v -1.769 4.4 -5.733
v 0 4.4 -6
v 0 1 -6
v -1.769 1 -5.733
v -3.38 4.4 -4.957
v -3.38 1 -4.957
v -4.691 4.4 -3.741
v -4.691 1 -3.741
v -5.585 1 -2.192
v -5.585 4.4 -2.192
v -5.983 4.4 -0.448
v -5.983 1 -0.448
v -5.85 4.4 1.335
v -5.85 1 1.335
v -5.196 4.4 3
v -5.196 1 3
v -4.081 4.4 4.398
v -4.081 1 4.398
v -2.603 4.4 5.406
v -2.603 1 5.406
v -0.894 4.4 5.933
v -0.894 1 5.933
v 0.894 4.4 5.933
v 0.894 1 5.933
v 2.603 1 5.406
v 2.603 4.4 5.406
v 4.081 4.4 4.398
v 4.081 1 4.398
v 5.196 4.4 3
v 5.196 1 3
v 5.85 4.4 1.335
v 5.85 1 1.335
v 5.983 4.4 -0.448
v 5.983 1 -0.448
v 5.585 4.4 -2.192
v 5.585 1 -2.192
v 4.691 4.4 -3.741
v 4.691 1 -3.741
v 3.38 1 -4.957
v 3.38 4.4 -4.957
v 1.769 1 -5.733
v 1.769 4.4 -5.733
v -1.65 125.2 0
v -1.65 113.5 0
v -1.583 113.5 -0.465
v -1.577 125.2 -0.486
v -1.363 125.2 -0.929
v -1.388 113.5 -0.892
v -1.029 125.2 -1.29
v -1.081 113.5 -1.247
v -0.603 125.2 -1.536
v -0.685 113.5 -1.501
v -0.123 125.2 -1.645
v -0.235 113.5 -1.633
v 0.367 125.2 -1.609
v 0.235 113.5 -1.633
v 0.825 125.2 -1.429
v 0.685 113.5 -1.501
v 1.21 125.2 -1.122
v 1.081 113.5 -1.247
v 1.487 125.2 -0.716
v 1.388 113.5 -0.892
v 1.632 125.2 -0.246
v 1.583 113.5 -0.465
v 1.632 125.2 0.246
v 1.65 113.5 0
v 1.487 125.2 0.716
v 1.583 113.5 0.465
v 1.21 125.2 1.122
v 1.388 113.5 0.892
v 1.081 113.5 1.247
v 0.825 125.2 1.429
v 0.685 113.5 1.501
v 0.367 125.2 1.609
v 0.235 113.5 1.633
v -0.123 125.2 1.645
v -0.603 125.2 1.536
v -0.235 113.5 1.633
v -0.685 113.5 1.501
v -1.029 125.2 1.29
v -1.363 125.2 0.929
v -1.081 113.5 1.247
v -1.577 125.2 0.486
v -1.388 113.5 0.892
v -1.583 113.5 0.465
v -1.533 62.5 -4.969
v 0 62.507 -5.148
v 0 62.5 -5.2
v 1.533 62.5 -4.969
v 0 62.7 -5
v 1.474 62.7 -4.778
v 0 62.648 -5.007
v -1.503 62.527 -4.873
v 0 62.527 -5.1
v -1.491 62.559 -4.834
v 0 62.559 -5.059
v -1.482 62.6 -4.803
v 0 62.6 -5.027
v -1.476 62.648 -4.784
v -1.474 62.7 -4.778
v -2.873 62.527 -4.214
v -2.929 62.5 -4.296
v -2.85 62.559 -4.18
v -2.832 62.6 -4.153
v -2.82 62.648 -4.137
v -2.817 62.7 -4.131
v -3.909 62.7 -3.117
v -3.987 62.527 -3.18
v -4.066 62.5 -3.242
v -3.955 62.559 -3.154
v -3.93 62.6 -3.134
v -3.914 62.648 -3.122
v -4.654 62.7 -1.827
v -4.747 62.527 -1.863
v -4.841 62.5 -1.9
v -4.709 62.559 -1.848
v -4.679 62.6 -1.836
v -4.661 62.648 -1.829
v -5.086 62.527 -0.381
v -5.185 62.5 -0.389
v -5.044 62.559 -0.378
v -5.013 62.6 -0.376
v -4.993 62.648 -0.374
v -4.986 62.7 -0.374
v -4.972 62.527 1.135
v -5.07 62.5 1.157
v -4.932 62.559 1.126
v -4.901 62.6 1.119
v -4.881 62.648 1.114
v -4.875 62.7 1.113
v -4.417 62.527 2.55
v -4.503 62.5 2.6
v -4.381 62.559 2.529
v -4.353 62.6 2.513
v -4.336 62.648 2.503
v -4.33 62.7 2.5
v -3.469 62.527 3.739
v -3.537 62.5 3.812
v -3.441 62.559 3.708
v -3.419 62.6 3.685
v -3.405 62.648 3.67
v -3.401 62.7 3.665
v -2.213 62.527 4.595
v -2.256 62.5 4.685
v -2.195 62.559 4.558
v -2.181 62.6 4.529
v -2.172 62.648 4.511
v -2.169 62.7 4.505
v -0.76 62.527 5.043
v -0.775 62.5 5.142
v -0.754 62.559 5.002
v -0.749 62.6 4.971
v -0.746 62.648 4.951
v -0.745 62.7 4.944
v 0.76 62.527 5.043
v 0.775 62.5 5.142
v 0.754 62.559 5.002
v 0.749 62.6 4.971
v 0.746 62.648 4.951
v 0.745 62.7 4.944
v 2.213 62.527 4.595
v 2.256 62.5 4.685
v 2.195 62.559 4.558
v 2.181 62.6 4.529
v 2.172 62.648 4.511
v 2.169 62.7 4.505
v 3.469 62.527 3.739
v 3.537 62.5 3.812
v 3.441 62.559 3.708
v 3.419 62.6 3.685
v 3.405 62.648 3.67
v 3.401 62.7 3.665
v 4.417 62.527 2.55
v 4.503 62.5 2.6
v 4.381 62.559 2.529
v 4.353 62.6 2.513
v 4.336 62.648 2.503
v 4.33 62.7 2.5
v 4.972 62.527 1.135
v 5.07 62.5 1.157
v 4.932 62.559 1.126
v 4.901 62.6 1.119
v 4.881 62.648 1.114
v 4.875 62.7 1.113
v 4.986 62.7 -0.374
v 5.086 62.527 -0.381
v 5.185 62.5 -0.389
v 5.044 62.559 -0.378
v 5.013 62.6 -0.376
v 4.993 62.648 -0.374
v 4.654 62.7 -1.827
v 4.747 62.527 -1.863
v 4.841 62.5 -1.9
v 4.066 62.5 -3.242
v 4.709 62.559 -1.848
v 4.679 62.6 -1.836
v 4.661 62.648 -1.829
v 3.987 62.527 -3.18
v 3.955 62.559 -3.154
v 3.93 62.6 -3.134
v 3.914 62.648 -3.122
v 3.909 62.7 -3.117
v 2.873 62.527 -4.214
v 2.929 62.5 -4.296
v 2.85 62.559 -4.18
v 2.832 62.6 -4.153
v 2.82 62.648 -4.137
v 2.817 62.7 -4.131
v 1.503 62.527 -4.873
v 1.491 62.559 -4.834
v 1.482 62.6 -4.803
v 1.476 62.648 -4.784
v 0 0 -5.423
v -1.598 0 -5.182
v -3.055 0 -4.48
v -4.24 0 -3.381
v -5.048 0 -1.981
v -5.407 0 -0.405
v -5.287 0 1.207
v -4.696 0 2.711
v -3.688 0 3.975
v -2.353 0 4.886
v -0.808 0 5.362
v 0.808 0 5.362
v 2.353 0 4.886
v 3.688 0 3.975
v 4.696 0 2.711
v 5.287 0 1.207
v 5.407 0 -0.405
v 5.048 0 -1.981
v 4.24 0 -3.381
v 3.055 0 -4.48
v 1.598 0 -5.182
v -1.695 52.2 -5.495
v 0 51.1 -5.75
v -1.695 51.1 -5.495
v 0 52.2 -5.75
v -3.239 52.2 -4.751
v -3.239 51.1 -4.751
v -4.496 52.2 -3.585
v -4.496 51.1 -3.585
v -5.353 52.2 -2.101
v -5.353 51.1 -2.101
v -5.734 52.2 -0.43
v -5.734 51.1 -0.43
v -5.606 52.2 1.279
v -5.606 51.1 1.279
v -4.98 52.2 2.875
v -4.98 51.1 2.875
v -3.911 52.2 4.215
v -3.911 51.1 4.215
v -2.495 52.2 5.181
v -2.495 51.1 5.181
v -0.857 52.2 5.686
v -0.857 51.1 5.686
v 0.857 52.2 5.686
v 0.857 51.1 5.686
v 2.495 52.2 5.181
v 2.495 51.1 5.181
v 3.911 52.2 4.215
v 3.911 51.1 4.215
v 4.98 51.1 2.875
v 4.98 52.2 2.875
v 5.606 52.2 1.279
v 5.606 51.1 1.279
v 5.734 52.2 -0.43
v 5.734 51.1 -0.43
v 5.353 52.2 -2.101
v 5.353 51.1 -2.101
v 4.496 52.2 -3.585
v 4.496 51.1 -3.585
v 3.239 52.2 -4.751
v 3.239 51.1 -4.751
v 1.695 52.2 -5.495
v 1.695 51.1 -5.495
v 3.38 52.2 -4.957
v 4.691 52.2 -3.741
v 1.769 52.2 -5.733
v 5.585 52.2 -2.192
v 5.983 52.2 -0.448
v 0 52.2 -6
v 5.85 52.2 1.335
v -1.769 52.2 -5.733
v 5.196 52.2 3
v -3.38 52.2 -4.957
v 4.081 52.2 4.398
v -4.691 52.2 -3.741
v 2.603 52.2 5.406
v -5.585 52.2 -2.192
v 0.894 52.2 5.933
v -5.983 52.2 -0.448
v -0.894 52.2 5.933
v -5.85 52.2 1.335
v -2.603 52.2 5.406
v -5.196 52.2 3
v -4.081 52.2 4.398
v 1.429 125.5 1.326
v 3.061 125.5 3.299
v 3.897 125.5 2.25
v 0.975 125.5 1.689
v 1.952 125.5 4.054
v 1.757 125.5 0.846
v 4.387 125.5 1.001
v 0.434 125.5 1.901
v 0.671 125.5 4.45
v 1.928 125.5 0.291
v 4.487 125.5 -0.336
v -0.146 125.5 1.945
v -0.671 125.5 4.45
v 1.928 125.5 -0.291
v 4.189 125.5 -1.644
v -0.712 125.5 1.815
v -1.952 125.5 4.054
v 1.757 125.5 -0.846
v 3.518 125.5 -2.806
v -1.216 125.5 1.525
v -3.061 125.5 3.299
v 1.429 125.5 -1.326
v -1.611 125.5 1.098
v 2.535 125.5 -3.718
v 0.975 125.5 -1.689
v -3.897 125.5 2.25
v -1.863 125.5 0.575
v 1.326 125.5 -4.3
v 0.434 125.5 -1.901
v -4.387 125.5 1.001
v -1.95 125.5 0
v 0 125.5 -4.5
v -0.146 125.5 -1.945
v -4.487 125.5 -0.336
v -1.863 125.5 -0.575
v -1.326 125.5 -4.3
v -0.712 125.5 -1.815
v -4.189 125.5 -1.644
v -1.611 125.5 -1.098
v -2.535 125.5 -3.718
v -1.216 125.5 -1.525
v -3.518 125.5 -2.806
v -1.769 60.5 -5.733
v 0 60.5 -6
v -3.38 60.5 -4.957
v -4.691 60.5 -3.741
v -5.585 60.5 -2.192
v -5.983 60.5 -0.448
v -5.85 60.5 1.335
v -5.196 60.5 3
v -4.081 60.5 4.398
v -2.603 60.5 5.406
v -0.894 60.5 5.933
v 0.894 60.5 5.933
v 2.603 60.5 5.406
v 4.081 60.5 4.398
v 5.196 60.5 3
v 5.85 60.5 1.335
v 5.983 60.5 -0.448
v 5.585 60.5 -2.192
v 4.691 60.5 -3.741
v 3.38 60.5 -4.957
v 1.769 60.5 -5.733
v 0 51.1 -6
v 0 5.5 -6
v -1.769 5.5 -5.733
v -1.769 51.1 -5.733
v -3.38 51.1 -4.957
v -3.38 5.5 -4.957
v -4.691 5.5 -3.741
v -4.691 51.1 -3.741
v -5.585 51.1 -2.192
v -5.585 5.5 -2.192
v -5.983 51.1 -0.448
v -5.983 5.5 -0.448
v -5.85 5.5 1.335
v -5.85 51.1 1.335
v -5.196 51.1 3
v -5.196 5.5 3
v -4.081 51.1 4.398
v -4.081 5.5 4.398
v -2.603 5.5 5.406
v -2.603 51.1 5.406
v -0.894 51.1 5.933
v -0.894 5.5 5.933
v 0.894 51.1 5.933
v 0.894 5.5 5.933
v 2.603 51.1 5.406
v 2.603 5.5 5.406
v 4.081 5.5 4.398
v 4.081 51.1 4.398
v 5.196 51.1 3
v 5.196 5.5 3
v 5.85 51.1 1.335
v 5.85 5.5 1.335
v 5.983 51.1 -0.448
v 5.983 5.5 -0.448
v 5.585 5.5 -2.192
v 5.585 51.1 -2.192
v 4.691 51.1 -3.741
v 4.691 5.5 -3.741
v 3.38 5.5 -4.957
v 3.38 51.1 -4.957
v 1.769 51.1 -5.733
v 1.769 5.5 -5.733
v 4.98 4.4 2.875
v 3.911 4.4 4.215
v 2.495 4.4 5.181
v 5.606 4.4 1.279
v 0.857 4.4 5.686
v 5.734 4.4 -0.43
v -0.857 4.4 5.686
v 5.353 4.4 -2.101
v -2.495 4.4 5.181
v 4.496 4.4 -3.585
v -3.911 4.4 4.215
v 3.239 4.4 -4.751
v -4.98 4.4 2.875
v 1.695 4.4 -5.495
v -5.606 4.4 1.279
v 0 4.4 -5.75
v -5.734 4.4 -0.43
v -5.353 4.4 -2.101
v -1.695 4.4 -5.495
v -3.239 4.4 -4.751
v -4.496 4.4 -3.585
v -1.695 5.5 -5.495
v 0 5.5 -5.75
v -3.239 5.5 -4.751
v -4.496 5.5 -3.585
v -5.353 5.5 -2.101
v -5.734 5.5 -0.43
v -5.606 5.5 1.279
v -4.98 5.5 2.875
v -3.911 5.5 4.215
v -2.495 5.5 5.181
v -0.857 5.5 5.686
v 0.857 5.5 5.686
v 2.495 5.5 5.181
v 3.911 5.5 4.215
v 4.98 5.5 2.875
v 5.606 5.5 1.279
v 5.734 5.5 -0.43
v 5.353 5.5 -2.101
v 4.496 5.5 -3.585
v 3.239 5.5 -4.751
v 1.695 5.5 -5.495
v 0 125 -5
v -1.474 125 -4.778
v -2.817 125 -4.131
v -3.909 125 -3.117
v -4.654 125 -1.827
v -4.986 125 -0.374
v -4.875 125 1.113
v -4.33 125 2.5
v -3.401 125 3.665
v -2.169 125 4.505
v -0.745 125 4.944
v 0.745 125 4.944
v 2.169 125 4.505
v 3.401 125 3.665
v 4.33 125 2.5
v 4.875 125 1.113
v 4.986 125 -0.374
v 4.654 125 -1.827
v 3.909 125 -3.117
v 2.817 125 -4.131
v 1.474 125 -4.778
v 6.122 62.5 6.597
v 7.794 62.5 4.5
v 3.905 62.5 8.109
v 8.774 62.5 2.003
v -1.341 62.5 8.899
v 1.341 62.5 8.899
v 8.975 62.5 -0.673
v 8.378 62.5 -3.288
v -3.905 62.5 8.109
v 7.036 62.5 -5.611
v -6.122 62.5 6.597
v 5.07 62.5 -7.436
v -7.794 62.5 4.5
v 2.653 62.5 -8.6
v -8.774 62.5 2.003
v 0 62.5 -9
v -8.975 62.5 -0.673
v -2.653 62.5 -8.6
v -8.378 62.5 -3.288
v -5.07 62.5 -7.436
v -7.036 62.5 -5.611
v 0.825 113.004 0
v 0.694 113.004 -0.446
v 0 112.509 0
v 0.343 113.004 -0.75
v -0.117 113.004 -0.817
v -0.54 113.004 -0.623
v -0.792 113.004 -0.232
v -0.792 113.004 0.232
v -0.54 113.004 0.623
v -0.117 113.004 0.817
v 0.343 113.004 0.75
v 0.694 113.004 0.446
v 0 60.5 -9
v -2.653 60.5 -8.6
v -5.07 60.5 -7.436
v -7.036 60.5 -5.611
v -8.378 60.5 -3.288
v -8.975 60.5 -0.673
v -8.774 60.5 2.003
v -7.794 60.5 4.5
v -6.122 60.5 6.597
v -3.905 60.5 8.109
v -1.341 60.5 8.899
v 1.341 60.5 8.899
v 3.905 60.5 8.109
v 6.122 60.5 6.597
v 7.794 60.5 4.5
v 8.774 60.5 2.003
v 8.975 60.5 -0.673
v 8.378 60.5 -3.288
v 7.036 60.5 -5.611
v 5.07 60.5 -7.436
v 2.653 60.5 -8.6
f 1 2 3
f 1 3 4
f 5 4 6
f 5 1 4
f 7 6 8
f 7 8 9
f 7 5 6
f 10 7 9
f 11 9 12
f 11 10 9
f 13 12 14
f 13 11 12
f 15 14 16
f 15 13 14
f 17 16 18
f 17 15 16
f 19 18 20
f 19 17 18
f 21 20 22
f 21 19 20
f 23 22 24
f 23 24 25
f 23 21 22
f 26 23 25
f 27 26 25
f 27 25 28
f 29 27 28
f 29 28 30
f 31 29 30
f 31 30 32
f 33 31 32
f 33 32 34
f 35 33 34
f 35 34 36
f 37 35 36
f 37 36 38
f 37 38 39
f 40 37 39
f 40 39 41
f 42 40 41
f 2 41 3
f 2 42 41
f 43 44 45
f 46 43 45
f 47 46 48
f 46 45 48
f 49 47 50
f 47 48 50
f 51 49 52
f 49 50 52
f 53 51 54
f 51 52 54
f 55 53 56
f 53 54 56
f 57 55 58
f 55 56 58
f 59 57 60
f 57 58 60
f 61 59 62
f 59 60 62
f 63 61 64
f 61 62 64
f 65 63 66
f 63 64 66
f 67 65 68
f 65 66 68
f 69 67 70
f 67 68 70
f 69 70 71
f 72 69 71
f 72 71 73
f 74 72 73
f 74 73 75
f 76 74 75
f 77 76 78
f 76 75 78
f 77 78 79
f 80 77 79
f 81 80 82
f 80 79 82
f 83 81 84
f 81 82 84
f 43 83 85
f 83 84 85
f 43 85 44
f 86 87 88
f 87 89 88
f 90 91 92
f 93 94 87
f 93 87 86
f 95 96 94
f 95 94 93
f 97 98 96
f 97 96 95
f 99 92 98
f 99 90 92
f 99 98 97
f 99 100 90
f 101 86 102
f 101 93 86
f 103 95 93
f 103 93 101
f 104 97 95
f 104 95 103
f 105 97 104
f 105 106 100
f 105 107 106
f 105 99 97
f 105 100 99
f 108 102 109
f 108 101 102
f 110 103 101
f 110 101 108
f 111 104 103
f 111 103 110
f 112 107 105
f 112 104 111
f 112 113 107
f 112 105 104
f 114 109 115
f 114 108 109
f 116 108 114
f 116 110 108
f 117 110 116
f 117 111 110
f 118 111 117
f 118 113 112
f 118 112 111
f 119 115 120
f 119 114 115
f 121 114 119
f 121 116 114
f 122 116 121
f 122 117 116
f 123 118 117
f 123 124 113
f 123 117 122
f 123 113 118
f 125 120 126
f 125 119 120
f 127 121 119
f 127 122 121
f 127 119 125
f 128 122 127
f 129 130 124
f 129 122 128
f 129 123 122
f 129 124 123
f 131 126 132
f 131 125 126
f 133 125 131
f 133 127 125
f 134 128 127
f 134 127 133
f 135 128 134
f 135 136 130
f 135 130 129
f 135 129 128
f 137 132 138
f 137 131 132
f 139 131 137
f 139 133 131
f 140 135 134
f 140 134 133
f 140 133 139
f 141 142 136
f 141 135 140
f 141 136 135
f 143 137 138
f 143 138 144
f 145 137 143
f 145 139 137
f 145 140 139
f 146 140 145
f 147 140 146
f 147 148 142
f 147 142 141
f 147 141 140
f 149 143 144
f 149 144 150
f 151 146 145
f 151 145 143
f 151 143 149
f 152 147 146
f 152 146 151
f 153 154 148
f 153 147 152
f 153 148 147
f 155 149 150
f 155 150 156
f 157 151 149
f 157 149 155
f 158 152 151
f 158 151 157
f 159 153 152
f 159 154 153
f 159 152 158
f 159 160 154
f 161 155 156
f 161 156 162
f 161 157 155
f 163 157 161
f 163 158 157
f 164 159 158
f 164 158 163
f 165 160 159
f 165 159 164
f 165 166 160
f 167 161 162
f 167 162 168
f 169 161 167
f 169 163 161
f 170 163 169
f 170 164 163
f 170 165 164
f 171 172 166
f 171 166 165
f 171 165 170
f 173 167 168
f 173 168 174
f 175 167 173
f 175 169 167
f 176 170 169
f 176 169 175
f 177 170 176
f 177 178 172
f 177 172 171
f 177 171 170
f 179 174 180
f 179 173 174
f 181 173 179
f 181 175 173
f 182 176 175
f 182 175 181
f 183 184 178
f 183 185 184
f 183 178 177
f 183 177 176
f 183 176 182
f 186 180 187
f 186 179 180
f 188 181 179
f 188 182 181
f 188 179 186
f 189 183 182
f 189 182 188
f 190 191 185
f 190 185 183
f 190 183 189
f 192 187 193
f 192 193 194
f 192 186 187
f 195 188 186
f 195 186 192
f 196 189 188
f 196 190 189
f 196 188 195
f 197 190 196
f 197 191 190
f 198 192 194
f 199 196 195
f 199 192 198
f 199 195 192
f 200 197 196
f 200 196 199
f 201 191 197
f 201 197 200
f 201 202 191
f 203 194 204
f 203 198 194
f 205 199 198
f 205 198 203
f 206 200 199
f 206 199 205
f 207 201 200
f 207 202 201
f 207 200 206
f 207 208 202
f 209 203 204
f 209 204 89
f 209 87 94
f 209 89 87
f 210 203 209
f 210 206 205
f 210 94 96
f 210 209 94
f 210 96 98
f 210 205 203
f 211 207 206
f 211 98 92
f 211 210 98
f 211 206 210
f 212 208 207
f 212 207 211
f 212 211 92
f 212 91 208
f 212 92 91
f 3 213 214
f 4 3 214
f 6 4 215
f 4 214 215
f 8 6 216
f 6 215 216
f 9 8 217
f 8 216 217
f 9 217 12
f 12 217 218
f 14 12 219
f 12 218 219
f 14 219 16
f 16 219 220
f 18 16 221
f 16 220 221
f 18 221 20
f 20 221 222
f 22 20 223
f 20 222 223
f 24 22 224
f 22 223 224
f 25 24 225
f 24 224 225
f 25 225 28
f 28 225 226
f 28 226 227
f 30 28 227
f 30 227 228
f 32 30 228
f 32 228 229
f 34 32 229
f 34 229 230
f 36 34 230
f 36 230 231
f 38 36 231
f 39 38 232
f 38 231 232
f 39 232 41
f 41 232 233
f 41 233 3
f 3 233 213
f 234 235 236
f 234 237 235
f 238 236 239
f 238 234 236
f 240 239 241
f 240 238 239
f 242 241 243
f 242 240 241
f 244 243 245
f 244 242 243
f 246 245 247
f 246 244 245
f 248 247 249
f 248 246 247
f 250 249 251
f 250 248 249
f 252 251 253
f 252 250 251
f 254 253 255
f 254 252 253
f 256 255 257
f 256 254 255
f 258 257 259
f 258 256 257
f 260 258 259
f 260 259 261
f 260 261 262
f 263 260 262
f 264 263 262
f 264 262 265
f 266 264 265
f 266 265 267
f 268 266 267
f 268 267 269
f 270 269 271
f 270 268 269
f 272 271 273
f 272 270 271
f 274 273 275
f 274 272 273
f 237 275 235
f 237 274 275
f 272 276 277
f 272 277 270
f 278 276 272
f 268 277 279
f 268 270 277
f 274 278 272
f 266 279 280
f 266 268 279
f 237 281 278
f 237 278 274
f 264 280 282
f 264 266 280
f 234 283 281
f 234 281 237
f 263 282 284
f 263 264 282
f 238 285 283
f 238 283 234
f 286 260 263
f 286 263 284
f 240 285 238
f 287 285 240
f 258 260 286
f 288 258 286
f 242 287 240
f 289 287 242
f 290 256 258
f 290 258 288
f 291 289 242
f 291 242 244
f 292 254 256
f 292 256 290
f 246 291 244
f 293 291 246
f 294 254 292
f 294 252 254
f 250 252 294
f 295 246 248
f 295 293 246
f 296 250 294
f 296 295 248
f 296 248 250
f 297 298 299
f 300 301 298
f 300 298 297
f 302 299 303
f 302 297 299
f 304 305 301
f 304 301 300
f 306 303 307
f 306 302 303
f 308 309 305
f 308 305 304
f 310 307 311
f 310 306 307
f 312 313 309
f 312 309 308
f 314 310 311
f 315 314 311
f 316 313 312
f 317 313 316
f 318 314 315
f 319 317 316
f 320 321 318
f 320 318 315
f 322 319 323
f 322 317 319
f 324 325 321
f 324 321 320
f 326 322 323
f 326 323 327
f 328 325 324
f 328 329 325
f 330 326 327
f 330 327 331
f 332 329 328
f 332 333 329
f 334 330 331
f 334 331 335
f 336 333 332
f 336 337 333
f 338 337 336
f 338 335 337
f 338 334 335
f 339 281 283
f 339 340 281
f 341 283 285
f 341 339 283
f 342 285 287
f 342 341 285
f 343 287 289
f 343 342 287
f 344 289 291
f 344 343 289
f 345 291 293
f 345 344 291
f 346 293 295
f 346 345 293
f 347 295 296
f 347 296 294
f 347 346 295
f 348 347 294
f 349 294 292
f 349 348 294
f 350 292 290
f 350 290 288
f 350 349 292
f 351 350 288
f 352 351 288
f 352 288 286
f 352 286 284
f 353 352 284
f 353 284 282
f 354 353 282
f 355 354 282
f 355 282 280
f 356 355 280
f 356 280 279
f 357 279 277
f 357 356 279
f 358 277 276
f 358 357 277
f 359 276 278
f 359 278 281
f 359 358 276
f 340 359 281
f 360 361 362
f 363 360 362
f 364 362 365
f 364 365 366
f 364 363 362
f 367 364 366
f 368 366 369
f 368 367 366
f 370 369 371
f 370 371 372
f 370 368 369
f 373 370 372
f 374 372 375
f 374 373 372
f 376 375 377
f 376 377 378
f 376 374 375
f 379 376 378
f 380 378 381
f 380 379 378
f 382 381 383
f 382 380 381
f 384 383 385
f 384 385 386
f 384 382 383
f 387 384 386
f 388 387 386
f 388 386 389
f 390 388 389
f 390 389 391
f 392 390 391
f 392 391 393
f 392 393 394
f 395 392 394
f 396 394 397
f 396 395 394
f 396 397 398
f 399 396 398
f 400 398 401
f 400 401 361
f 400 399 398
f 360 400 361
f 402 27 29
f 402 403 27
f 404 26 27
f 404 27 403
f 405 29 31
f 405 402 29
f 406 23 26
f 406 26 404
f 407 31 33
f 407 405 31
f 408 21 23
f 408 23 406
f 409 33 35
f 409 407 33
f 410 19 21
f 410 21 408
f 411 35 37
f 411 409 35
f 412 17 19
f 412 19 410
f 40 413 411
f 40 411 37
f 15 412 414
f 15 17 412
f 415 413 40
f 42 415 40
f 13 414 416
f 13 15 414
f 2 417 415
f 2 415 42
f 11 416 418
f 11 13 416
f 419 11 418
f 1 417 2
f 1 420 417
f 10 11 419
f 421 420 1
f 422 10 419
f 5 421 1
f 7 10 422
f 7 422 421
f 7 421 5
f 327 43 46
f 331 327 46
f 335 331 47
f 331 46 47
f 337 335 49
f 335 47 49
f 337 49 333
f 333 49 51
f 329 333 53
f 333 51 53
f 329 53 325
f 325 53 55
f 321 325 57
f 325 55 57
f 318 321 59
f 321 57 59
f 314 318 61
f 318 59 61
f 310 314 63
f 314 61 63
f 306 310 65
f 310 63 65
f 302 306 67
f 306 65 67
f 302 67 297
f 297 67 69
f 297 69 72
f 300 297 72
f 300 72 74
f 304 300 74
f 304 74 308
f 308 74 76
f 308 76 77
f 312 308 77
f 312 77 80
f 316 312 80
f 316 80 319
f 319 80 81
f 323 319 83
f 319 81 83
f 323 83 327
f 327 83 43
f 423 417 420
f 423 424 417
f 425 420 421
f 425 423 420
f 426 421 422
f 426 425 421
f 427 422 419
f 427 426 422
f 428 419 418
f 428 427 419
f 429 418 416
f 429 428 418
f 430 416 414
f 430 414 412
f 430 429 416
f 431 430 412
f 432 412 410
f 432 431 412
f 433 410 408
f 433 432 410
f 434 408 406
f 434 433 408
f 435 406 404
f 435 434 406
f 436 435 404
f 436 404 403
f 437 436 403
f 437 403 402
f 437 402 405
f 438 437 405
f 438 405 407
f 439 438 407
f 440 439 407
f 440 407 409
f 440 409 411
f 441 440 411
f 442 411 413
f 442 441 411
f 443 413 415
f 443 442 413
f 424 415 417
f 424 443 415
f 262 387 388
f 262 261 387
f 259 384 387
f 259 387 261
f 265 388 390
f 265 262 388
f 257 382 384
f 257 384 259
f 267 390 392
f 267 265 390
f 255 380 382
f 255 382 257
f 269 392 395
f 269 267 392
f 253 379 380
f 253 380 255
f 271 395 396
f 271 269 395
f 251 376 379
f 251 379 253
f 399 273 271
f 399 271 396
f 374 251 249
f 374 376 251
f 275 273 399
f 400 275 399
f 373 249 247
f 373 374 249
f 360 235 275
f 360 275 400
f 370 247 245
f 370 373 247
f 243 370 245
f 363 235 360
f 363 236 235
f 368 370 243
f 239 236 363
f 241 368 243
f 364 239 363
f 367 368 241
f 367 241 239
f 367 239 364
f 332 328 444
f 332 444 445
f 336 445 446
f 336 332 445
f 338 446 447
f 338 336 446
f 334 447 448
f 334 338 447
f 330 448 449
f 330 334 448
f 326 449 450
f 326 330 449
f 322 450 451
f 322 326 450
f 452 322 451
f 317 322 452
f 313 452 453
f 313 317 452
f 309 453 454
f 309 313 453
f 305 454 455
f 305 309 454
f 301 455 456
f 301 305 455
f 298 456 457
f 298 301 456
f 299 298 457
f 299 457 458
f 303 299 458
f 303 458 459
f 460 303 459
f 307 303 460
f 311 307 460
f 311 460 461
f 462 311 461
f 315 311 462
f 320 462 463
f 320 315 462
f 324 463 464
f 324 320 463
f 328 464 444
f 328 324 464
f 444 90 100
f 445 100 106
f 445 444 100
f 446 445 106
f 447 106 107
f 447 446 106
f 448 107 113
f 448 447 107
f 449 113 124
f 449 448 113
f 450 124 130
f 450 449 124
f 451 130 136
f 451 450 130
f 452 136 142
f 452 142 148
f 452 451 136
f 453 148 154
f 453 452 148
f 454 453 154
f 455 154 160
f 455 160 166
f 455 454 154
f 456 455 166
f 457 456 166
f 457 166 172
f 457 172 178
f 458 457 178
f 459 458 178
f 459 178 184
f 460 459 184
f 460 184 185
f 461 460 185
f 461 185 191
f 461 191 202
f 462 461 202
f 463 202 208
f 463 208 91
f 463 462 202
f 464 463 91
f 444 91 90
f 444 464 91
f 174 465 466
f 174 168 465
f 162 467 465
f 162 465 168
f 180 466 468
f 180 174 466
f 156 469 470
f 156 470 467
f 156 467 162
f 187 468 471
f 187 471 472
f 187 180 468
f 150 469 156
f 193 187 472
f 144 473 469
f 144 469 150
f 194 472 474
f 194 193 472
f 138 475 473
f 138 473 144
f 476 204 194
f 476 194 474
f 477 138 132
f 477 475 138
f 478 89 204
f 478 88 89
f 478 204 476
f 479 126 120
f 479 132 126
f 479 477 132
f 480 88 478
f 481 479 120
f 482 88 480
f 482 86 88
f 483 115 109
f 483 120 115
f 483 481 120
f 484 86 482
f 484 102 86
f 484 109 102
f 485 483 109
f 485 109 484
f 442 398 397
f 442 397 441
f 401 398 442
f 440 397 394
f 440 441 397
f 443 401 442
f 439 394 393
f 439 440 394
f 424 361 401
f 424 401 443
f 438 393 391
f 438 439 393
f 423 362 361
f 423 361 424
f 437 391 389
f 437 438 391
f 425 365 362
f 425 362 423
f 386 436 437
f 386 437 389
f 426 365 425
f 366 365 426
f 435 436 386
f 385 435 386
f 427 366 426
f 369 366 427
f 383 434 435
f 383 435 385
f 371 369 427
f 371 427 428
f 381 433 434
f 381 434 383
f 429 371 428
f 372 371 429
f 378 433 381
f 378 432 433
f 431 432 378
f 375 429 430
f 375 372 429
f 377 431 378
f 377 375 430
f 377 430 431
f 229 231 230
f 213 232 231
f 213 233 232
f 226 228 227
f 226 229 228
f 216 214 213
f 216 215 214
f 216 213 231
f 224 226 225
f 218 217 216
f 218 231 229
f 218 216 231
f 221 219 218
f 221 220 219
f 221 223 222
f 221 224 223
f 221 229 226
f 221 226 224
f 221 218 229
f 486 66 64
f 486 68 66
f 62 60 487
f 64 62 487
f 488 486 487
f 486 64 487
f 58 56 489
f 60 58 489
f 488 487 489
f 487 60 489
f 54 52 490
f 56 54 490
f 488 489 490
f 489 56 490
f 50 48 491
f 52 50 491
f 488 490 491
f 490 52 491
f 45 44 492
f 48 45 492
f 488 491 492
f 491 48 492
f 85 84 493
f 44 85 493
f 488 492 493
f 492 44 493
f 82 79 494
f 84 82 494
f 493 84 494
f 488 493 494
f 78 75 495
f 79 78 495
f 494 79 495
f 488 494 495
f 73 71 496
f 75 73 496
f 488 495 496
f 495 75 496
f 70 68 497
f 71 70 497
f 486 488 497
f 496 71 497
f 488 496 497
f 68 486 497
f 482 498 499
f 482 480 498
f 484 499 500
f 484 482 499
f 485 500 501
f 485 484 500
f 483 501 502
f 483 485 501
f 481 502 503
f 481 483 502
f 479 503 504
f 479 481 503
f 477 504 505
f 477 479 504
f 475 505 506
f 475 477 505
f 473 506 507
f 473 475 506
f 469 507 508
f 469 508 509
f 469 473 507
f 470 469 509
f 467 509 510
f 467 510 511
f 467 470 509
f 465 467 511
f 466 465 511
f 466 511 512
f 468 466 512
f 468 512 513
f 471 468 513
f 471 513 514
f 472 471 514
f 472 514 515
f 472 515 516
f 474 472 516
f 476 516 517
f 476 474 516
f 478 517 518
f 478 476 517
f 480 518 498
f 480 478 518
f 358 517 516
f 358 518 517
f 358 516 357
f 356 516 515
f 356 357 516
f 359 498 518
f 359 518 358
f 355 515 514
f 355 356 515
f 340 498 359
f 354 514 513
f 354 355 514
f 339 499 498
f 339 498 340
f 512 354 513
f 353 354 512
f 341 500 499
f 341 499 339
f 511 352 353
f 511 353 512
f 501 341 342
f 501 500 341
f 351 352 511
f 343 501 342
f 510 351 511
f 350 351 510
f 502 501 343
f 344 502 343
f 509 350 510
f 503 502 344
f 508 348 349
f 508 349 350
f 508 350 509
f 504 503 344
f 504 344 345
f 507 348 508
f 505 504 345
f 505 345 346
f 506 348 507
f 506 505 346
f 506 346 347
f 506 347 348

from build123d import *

# Parameters (mm, degrees)
ZKOSEN_1_SIZE   = 0.5
ZKOSEN_2_SIZE   = 1
ZKOSEN_2_SIZE2  = 0.577350269
ZAOBLIT3_R      = 0.2
M4_Z_VIT1_D     = 3.3
M4_Z_VIT1_DEPTH = 12
M4_Z_VIT1_TIP   = 0.991420021
ZKOSEN_4_SIZE   = 0.3


with BuildPart() as part:
    # Skica1 → Rotovat1 (revolve)
    with BuildSketch(Plane.XY, mode=Mode.PRIVATE) as rotovat1_sk:
        Polygon((-6, 0), (-6, 4.4), (-5.75, 4.4), (-5.75, 5.5), (-6, 5.5), (-6, 51.1), (-5.75, 51.1), (-5.75, 52.2), (-6, 52.2), (-6, 60.5), (-9, 60.5), (-9, 62.5), (-5, 62.5), (-5, 125.5), (0, 125.5), (0, 0), align=None)
    revolve(rotovat1_sk.sketch.rotate(Axis((0, 0, 0), (0, 1, 0)), 270), axis=Axis((0, 0, 0), (0, 1, 0)))

    # Zkosení1
    zkosen_1_edges = [part.edges().sort_by_distance(p)[0] for p in [
        (0, 125.5, 5),
    ]]
    chamfer(zkosen_1_edges, length=ZKOSEN_1_SIZE)

    # Zkosení2
    zkosen_2_edges = [part.edges().sort_by_distance(p)[0] for p in [
        (0, 0, 6),
    ]]
    zkosen_2_side = [part.faces().sort_by_distance(p)[0] for p in [
        (0, 2.2, 6),
    ]]
    chamfer(zkosen_2_edges, length=ZKOSEN_2_SIZE, length2=ZKOSEN_2_SIZE2, reference=zkosen_2_side[0])

    # Zaoblit3
    zaoblit3_edges = [part.edges().sort_by_distance(p)[0] for p in [
        (0, 62.5, 5),
    ]]
    fillet(zaoblit3_edges, radius=ZAOBLIT3_R)

    # M4 závit1
    with Locations(Plane(origin=(0, 125.5, 0), x_dir=(1, 0, 0), z_dir=(0, 1, 0))):
        with Locations((0, 0)):
            Hole(M4_Z_VIT1_D / 2, depth=M4_Z_VIT1_DEPTH)
            with Locations((0, 0, -(M4_Z_VIT1_DEPTH + M4_Z_VIT1_TIP / 2))):  # 118° drill point
                Cone(0, M4_Z_VIT1_D / 2, M4_Z_VIT1_TIP, mode=Mode.SUBTRACT)

    # Zkosení4
    zkosen_4_edges = [part.edges().sort_by_distance(p)[0] for p in [
        (1.65, 125.5, 0),
    ]]
    chamfer(zkosen_4_edges, length=ZKOSEN_4_SIZE)


solid = part.part
